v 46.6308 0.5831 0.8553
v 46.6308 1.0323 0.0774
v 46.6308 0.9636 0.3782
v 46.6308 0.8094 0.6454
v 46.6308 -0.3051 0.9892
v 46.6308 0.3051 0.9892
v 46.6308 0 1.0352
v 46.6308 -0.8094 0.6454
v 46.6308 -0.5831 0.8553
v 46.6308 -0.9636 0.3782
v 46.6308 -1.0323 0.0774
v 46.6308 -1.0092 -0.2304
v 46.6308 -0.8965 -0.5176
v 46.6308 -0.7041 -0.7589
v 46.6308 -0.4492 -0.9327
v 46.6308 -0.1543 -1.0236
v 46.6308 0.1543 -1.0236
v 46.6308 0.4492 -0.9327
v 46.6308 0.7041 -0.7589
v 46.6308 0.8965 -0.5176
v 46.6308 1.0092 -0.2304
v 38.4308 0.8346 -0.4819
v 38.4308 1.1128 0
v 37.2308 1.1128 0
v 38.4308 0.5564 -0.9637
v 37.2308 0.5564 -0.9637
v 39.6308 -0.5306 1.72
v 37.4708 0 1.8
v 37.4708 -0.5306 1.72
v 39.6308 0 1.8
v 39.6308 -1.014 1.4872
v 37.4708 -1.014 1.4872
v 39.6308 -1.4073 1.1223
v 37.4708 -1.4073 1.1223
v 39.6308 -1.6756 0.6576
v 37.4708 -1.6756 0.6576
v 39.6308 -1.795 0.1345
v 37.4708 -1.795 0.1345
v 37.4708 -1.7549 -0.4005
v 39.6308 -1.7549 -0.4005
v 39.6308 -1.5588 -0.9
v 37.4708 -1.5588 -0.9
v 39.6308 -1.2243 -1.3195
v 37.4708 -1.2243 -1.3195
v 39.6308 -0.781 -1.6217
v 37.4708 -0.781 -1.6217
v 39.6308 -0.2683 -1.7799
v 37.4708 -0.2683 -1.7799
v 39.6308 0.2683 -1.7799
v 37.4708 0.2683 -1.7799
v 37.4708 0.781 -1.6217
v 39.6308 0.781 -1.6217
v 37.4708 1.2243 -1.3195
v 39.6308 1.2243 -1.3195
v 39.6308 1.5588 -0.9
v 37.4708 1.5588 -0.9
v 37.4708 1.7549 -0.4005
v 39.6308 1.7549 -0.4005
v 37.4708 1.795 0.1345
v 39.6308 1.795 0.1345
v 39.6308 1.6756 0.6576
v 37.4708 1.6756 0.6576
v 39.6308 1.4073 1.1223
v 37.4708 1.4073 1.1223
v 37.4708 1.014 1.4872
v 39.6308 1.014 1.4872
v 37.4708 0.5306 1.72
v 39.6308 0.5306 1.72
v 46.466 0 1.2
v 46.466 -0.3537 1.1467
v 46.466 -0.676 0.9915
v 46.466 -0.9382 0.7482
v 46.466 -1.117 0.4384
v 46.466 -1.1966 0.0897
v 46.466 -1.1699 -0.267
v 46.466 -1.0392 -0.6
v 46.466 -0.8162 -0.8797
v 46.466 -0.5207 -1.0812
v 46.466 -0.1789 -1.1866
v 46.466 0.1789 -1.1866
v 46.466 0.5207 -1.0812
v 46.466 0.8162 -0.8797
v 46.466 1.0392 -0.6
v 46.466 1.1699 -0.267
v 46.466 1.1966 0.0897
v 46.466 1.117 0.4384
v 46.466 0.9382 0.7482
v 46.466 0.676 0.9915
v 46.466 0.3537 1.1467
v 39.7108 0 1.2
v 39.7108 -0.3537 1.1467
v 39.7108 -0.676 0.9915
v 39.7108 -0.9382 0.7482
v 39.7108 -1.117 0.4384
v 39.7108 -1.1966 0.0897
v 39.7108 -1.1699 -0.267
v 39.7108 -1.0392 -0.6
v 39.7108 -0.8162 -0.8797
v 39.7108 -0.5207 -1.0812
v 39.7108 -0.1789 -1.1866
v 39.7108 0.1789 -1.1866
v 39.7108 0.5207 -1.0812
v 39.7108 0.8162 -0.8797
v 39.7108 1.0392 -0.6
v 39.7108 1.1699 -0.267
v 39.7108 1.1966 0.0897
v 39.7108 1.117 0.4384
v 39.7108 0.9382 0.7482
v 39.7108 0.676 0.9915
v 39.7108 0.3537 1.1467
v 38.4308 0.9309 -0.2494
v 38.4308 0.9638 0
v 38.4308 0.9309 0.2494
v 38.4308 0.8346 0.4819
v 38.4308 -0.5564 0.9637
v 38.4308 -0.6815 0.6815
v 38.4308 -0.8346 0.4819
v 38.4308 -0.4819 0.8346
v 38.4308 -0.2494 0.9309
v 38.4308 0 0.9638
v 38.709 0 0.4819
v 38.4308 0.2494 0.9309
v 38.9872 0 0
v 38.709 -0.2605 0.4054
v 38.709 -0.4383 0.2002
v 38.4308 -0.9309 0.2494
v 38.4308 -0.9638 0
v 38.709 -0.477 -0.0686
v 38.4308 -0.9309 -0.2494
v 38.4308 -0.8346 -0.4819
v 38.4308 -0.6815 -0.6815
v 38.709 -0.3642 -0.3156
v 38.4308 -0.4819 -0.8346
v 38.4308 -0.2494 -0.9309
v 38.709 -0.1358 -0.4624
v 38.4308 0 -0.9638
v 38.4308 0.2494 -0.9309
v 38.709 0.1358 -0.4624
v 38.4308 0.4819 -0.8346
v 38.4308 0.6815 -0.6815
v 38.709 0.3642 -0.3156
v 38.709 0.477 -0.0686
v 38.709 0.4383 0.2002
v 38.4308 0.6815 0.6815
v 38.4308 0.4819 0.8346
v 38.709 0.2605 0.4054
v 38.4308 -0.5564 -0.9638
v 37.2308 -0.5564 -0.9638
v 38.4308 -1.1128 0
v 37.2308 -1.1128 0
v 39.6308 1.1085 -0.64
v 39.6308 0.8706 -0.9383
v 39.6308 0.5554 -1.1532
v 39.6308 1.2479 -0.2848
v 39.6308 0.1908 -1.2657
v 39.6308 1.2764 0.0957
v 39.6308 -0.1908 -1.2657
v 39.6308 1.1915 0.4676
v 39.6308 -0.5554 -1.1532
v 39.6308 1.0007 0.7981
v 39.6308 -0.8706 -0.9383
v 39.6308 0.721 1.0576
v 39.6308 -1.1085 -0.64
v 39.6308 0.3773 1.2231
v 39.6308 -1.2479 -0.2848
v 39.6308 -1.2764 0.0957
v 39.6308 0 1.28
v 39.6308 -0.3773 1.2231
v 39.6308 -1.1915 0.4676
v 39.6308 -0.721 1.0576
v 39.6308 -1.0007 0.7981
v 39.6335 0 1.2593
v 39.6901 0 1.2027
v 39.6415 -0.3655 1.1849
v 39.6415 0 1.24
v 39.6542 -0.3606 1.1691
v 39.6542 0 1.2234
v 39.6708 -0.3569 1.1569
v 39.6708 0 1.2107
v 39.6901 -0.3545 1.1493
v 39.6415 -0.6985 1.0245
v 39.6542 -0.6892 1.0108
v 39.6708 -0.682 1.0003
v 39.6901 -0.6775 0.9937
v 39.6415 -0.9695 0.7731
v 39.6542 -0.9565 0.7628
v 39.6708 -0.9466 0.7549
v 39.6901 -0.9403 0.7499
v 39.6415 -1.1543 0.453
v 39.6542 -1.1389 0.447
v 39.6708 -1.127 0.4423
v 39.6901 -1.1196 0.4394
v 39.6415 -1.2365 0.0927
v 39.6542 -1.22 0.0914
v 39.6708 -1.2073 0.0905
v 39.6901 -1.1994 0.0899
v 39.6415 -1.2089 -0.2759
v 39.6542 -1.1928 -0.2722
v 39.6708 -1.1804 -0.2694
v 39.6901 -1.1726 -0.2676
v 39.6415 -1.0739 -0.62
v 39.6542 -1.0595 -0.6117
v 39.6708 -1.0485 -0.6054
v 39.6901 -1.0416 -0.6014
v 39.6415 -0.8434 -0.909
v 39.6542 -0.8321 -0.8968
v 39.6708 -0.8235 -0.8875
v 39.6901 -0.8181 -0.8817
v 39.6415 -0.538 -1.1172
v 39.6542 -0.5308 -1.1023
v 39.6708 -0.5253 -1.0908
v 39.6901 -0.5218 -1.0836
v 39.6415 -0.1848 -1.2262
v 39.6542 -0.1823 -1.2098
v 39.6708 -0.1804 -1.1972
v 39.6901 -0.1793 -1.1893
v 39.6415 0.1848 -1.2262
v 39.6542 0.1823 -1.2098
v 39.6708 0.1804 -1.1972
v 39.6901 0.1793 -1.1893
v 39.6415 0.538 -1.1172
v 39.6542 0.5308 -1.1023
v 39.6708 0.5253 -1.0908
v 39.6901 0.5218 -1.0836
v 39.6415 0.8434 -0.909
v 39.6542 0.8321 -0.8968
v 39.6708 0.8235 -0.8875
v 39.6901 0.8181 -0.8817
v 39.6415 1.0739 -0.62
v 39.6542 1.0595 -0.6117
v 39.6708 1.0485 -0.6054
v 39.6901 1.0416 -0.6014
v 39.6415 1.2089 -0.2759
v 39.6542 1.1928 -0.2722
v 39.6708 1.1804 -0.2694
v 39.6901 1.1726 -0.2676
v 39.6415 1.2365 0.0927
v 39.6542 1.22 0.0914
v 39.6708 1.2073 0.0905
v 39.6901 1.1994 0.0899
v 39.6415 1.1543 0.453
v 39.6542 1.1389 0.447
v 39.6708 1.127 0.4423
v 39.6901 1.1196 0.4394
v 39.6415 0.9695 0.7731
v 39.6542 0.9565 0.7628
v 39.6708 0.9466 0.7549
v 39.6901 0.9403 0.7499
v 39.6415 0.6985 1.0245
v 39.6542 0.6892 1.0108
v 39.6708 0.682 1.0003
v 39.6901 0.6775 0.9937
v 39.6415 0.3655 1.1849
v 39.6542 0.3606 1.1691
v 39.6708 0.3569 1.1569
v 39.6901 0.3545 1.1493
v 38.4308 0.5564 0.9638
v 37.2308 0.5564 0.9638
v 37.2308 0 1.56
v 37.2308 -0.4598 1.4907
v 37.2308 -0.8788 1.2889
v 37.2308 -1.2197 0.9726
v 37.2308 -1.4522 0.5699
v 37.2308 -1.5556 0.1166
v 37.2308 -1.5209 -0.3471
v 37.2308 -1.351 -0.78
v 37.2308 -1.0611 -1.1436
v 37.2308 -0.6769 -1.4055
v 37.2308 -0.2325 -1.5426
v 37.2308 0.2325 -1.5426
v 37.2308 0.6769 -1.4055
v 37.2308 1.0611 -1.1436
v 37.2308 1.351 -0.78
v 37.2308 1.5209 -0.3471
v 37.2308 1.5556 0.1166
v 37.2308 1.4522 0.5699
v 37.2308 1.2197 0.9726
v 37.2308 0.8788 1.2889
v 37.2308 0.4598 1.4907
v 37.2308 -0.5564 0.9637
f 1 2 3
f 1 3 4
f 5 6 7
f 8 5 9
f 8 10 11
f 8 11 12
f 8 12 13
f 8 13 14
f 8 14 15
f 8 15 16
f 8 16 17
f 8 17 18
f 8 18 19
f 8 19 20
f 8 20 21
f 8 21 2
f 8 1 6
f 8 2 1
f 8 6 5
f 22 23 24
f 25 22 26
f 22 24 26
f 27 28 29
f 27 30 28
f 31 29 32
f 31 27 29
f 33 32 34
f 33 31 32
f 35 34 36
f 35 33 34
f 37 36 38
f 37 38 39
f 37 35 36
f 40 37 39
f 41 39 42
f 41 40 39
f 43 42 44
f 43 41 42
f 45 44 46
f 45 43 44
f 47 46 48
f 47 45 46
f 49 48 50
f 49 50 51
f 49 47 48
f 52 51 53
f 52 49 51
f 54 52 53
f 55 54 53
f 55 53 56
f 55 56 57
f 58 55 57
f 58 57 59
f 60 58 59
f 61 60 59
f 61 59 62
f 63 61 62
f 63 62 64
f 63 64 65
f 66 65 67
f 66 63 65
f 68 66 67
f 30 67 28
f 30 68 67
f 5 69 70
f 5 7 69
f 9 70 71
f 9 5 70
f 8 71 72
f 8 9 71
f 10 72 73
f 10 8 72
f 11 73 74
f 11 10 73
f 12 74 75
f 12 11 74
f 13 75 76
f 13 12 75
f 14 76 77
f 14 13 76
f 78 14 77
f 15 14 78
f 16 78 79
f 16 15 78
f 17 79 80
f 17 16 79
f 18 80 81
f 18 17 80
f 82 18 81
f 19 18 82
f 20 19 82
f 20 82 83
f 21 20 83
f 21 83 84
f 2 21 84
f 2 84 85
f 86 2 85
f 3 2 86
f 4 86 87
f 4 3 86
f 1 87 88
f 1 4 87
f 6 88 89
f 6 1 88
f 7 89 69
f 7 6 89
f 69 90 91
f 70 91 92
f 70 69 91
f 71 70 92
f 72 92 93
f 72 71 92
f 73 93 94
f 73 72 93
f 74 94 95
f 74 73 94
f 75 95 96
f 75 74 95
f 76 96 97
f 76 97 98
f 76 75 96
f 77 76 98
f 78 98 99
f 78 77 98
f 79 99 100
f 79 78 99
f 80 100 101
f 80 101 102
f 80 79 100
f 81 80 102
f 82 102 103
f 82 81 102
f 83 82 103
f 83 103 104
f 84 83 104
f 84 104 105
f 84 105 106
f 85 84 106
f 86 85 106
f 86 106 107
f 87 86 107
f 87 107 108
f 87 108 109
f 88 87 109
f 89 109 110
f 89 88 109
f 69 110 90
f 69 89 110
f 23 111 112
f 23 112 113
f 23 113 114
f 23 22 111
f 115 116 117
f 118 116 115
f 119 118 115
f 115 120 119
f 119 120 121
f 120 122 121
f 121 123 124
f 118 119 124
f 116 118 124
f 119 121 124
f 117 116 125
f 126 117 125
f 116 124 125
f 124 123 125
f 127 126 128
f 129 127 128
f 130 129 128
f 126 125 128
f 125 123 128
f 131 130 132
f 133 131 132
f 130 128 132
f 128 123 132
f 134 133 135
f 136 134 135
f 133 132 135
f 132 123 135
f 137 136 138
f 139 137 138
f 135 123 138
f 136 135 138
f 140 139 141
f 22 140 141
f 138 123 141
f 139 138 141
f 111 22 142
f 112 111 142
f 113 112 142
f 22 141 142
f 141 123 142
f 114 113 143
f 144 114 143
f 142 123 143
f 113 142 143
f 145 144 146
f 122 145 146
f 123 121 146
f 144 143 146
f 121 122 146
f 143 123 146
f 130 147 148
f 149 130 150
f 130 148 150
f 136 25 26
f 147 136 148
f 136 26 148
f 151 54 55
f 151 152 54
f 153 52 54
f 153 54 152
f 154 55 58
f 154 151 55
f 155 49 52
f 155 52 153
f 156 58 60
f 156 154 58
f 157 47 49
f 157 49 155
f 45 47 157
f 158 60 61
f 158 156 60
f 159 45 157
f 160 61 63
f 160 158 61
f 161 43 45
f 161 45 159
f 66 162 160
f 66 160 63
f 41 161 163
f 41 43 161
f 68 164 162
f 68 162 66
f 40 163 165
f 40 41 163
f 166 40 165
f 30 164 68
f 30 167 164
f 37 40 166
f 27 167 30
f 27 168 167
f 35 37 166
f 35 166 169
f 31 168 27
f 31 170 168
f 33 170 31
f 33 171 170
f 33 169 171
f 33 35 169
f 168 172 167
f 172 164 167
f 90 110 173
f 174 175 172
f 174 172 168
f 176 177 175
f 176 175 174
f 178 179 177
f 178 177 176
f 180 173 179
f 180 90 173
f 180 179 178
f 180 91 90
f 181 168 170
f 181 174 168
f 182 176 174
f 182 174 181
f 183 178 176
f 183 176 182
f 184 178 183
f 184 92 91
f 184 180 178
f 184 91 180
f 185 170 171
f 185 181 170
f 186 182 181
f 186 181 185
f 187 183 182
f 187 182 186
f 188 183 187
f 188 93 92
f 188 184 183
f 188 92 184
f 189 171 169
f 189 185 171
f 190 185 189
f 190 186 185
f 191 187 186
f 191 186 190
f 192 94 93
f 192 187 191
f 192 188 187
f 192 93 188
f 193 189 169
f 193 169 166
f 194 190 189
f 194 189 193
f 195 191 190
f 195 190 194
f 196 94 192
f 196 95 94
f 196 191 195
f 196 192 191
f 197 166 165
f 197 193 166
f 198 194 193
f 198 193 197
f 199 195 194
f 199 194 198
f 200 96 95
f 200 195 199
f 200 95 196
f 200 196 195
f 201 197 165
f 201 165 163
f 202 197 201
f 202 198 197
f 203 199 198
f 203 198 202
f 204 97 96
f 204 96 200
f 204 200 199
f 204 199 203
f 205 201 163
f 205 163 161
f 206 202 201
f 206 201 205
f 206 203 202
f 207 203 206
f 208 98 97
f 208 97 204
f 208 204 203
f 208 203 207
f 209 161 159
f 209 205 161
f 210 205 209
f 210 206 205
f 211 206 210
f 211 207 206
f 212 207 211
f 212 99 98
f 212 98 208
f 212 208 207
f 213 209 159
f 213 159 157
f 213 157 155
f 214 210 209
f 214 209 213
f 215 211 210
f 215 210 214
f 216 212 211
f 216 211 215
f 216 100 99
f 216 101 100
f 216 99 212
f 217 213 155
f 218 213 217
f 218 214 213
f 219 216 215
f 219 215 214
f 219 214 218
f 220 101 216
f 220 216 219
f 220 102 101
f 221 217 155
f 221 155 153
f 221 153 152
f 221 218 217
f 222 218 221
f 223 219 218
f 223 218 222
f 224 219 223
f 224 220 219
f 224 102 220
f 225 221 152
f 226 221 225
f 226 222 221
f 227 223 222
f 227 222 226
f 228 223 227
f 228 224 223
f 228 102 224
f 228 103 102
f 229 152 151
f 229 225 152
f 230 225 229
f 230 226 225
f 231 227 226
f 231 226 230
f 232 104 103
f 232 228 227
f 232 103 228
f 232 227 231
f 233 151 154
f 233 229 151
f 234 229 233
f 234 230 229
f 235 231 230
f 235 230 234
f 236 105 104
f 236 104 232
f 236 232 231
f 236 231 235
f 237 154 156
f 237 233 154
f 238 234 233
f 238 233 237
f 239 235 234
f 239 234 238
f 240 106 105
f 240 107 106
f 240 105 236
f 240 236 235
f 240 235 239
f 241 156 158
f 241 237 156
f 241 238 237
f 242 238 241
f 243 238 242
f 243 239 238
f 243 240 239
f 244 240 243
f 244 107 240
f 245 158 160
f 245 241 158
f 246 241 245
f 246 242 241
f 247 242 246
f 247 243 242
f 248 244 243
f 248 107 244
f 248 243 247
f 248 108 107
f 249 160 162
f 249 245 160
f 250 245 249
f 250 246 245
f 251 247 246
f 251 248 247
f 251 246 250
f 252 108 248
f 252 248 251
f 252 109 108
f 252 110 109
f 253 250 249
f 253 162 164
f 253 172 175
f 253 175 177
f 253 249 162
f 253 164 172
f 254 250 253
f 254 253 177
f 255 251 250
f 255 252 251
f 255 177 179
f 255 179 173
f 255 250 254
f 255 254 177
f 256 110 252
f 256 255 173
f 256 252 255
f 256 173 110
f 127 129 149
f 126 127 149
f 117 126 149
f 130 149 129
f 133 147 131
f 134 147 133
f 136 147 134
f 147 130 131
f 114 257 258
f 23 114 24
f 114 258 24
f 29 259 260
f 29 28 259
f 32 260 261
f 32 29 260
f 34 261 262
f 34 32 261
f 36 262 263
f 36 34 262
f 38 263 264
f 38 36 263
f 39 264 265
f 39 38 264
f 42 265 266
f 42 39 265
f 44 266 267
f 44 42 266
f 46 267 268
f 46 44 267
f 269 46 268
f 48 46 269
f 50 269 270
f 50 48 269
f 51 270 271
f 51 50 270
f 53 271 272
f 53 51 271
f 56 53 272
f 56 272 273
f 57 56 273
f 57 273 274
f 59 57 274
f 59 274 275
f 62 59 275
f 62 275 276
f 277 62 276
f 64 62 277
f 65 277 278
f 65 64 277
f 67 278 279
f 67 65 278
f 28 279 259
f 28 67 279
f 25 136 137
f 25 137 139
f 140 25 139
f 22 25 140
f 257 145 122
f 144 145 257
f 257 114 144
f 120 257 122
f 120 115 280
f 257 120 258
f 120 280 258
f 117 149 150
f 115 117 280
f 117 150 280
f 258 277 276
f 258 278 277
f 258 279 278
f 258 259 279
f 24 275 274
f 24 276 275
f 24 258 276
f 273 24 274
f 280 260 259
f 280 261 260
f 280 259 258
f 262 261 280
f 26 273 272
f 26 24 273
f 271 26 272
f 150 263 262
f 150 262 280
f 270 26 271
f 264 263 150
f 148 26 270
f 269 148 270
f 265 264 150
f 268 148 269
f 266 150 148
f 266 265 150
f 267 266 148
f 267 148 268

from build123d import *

# Parameters (mm, degrees)
FILLET1_R    = 0.8
HEX_2_DEPTH  = 12
SCALE1_SCALE = 0.1


with BuildPart() as part:
    # BodySke → Base-Revolve (revolve)
    with BuildSketch(Plane.XY, mode=Mode.PRIVATE) as base_revolve_sk:
        Polygon((0, 0), (0, 15.6), (2.4, 18), (24, 18), (24, 12), (92.352, 12), (94, 10.352), (94, 0), align=None)
    revolve(base_revolve_sk.sketch.rotate(Axis((-31.75, 0, 0), (1, 0, 0)), 90), axis=Axis((-31.75, 0, 0), (1, 0, 0)))

    # Fillet1
    fillet1_edges = [part.edges().sort_by_distance(p)[0] for p in [
        (24, 0, -12),
    ]]
    fillet(fillet1_edges, radius=FILLET1_R)

    # Sketch2 → Hex-PreBroach (revolve, cut)
    with BuildSketch(Plane.XY, mode=Mode.PRIVATE) as hex_prebroach_sk:
        Polygon((0, 9.6375), (12, 9.6375), (17.564213219, 0), (0, 0), align=None)
    revolve(hex_prebroach_sk.sketch.rotate(Axis((0, 0, 0), (1, 0, 0)), 90), axis=Axis((0, 0, 0), (1, 0, 0)), mode=Mode.SUBTRACT)

    # Sketch3 → Hex 2 (cut)
    with BuildSketch(Plane(origin=(0, 0, 0), x_dir=(0, 0.500000000000001, 0.866025403784438), z_dir=(-1, 0, 0))):
        Polygon((5.564213219, 9.6375), (-5.564213219, 9.6375), (-11.128426439, 0), (-5.564213219, -9.6375), (5.564213219, -9.6375), (11.128426439, 0), align=None)
    extrude(amount=-HEX_2_DEPTH, mode=Mode.SUBTRACT)


with BuildPart() as part_1:
    # Scale1: scaled about (41.367569692, 0, 0)
    add(part.part.scale(SCALE1_SCALE).moved(Location((37.230812723, 0, 0))))


solid = part_1.part
